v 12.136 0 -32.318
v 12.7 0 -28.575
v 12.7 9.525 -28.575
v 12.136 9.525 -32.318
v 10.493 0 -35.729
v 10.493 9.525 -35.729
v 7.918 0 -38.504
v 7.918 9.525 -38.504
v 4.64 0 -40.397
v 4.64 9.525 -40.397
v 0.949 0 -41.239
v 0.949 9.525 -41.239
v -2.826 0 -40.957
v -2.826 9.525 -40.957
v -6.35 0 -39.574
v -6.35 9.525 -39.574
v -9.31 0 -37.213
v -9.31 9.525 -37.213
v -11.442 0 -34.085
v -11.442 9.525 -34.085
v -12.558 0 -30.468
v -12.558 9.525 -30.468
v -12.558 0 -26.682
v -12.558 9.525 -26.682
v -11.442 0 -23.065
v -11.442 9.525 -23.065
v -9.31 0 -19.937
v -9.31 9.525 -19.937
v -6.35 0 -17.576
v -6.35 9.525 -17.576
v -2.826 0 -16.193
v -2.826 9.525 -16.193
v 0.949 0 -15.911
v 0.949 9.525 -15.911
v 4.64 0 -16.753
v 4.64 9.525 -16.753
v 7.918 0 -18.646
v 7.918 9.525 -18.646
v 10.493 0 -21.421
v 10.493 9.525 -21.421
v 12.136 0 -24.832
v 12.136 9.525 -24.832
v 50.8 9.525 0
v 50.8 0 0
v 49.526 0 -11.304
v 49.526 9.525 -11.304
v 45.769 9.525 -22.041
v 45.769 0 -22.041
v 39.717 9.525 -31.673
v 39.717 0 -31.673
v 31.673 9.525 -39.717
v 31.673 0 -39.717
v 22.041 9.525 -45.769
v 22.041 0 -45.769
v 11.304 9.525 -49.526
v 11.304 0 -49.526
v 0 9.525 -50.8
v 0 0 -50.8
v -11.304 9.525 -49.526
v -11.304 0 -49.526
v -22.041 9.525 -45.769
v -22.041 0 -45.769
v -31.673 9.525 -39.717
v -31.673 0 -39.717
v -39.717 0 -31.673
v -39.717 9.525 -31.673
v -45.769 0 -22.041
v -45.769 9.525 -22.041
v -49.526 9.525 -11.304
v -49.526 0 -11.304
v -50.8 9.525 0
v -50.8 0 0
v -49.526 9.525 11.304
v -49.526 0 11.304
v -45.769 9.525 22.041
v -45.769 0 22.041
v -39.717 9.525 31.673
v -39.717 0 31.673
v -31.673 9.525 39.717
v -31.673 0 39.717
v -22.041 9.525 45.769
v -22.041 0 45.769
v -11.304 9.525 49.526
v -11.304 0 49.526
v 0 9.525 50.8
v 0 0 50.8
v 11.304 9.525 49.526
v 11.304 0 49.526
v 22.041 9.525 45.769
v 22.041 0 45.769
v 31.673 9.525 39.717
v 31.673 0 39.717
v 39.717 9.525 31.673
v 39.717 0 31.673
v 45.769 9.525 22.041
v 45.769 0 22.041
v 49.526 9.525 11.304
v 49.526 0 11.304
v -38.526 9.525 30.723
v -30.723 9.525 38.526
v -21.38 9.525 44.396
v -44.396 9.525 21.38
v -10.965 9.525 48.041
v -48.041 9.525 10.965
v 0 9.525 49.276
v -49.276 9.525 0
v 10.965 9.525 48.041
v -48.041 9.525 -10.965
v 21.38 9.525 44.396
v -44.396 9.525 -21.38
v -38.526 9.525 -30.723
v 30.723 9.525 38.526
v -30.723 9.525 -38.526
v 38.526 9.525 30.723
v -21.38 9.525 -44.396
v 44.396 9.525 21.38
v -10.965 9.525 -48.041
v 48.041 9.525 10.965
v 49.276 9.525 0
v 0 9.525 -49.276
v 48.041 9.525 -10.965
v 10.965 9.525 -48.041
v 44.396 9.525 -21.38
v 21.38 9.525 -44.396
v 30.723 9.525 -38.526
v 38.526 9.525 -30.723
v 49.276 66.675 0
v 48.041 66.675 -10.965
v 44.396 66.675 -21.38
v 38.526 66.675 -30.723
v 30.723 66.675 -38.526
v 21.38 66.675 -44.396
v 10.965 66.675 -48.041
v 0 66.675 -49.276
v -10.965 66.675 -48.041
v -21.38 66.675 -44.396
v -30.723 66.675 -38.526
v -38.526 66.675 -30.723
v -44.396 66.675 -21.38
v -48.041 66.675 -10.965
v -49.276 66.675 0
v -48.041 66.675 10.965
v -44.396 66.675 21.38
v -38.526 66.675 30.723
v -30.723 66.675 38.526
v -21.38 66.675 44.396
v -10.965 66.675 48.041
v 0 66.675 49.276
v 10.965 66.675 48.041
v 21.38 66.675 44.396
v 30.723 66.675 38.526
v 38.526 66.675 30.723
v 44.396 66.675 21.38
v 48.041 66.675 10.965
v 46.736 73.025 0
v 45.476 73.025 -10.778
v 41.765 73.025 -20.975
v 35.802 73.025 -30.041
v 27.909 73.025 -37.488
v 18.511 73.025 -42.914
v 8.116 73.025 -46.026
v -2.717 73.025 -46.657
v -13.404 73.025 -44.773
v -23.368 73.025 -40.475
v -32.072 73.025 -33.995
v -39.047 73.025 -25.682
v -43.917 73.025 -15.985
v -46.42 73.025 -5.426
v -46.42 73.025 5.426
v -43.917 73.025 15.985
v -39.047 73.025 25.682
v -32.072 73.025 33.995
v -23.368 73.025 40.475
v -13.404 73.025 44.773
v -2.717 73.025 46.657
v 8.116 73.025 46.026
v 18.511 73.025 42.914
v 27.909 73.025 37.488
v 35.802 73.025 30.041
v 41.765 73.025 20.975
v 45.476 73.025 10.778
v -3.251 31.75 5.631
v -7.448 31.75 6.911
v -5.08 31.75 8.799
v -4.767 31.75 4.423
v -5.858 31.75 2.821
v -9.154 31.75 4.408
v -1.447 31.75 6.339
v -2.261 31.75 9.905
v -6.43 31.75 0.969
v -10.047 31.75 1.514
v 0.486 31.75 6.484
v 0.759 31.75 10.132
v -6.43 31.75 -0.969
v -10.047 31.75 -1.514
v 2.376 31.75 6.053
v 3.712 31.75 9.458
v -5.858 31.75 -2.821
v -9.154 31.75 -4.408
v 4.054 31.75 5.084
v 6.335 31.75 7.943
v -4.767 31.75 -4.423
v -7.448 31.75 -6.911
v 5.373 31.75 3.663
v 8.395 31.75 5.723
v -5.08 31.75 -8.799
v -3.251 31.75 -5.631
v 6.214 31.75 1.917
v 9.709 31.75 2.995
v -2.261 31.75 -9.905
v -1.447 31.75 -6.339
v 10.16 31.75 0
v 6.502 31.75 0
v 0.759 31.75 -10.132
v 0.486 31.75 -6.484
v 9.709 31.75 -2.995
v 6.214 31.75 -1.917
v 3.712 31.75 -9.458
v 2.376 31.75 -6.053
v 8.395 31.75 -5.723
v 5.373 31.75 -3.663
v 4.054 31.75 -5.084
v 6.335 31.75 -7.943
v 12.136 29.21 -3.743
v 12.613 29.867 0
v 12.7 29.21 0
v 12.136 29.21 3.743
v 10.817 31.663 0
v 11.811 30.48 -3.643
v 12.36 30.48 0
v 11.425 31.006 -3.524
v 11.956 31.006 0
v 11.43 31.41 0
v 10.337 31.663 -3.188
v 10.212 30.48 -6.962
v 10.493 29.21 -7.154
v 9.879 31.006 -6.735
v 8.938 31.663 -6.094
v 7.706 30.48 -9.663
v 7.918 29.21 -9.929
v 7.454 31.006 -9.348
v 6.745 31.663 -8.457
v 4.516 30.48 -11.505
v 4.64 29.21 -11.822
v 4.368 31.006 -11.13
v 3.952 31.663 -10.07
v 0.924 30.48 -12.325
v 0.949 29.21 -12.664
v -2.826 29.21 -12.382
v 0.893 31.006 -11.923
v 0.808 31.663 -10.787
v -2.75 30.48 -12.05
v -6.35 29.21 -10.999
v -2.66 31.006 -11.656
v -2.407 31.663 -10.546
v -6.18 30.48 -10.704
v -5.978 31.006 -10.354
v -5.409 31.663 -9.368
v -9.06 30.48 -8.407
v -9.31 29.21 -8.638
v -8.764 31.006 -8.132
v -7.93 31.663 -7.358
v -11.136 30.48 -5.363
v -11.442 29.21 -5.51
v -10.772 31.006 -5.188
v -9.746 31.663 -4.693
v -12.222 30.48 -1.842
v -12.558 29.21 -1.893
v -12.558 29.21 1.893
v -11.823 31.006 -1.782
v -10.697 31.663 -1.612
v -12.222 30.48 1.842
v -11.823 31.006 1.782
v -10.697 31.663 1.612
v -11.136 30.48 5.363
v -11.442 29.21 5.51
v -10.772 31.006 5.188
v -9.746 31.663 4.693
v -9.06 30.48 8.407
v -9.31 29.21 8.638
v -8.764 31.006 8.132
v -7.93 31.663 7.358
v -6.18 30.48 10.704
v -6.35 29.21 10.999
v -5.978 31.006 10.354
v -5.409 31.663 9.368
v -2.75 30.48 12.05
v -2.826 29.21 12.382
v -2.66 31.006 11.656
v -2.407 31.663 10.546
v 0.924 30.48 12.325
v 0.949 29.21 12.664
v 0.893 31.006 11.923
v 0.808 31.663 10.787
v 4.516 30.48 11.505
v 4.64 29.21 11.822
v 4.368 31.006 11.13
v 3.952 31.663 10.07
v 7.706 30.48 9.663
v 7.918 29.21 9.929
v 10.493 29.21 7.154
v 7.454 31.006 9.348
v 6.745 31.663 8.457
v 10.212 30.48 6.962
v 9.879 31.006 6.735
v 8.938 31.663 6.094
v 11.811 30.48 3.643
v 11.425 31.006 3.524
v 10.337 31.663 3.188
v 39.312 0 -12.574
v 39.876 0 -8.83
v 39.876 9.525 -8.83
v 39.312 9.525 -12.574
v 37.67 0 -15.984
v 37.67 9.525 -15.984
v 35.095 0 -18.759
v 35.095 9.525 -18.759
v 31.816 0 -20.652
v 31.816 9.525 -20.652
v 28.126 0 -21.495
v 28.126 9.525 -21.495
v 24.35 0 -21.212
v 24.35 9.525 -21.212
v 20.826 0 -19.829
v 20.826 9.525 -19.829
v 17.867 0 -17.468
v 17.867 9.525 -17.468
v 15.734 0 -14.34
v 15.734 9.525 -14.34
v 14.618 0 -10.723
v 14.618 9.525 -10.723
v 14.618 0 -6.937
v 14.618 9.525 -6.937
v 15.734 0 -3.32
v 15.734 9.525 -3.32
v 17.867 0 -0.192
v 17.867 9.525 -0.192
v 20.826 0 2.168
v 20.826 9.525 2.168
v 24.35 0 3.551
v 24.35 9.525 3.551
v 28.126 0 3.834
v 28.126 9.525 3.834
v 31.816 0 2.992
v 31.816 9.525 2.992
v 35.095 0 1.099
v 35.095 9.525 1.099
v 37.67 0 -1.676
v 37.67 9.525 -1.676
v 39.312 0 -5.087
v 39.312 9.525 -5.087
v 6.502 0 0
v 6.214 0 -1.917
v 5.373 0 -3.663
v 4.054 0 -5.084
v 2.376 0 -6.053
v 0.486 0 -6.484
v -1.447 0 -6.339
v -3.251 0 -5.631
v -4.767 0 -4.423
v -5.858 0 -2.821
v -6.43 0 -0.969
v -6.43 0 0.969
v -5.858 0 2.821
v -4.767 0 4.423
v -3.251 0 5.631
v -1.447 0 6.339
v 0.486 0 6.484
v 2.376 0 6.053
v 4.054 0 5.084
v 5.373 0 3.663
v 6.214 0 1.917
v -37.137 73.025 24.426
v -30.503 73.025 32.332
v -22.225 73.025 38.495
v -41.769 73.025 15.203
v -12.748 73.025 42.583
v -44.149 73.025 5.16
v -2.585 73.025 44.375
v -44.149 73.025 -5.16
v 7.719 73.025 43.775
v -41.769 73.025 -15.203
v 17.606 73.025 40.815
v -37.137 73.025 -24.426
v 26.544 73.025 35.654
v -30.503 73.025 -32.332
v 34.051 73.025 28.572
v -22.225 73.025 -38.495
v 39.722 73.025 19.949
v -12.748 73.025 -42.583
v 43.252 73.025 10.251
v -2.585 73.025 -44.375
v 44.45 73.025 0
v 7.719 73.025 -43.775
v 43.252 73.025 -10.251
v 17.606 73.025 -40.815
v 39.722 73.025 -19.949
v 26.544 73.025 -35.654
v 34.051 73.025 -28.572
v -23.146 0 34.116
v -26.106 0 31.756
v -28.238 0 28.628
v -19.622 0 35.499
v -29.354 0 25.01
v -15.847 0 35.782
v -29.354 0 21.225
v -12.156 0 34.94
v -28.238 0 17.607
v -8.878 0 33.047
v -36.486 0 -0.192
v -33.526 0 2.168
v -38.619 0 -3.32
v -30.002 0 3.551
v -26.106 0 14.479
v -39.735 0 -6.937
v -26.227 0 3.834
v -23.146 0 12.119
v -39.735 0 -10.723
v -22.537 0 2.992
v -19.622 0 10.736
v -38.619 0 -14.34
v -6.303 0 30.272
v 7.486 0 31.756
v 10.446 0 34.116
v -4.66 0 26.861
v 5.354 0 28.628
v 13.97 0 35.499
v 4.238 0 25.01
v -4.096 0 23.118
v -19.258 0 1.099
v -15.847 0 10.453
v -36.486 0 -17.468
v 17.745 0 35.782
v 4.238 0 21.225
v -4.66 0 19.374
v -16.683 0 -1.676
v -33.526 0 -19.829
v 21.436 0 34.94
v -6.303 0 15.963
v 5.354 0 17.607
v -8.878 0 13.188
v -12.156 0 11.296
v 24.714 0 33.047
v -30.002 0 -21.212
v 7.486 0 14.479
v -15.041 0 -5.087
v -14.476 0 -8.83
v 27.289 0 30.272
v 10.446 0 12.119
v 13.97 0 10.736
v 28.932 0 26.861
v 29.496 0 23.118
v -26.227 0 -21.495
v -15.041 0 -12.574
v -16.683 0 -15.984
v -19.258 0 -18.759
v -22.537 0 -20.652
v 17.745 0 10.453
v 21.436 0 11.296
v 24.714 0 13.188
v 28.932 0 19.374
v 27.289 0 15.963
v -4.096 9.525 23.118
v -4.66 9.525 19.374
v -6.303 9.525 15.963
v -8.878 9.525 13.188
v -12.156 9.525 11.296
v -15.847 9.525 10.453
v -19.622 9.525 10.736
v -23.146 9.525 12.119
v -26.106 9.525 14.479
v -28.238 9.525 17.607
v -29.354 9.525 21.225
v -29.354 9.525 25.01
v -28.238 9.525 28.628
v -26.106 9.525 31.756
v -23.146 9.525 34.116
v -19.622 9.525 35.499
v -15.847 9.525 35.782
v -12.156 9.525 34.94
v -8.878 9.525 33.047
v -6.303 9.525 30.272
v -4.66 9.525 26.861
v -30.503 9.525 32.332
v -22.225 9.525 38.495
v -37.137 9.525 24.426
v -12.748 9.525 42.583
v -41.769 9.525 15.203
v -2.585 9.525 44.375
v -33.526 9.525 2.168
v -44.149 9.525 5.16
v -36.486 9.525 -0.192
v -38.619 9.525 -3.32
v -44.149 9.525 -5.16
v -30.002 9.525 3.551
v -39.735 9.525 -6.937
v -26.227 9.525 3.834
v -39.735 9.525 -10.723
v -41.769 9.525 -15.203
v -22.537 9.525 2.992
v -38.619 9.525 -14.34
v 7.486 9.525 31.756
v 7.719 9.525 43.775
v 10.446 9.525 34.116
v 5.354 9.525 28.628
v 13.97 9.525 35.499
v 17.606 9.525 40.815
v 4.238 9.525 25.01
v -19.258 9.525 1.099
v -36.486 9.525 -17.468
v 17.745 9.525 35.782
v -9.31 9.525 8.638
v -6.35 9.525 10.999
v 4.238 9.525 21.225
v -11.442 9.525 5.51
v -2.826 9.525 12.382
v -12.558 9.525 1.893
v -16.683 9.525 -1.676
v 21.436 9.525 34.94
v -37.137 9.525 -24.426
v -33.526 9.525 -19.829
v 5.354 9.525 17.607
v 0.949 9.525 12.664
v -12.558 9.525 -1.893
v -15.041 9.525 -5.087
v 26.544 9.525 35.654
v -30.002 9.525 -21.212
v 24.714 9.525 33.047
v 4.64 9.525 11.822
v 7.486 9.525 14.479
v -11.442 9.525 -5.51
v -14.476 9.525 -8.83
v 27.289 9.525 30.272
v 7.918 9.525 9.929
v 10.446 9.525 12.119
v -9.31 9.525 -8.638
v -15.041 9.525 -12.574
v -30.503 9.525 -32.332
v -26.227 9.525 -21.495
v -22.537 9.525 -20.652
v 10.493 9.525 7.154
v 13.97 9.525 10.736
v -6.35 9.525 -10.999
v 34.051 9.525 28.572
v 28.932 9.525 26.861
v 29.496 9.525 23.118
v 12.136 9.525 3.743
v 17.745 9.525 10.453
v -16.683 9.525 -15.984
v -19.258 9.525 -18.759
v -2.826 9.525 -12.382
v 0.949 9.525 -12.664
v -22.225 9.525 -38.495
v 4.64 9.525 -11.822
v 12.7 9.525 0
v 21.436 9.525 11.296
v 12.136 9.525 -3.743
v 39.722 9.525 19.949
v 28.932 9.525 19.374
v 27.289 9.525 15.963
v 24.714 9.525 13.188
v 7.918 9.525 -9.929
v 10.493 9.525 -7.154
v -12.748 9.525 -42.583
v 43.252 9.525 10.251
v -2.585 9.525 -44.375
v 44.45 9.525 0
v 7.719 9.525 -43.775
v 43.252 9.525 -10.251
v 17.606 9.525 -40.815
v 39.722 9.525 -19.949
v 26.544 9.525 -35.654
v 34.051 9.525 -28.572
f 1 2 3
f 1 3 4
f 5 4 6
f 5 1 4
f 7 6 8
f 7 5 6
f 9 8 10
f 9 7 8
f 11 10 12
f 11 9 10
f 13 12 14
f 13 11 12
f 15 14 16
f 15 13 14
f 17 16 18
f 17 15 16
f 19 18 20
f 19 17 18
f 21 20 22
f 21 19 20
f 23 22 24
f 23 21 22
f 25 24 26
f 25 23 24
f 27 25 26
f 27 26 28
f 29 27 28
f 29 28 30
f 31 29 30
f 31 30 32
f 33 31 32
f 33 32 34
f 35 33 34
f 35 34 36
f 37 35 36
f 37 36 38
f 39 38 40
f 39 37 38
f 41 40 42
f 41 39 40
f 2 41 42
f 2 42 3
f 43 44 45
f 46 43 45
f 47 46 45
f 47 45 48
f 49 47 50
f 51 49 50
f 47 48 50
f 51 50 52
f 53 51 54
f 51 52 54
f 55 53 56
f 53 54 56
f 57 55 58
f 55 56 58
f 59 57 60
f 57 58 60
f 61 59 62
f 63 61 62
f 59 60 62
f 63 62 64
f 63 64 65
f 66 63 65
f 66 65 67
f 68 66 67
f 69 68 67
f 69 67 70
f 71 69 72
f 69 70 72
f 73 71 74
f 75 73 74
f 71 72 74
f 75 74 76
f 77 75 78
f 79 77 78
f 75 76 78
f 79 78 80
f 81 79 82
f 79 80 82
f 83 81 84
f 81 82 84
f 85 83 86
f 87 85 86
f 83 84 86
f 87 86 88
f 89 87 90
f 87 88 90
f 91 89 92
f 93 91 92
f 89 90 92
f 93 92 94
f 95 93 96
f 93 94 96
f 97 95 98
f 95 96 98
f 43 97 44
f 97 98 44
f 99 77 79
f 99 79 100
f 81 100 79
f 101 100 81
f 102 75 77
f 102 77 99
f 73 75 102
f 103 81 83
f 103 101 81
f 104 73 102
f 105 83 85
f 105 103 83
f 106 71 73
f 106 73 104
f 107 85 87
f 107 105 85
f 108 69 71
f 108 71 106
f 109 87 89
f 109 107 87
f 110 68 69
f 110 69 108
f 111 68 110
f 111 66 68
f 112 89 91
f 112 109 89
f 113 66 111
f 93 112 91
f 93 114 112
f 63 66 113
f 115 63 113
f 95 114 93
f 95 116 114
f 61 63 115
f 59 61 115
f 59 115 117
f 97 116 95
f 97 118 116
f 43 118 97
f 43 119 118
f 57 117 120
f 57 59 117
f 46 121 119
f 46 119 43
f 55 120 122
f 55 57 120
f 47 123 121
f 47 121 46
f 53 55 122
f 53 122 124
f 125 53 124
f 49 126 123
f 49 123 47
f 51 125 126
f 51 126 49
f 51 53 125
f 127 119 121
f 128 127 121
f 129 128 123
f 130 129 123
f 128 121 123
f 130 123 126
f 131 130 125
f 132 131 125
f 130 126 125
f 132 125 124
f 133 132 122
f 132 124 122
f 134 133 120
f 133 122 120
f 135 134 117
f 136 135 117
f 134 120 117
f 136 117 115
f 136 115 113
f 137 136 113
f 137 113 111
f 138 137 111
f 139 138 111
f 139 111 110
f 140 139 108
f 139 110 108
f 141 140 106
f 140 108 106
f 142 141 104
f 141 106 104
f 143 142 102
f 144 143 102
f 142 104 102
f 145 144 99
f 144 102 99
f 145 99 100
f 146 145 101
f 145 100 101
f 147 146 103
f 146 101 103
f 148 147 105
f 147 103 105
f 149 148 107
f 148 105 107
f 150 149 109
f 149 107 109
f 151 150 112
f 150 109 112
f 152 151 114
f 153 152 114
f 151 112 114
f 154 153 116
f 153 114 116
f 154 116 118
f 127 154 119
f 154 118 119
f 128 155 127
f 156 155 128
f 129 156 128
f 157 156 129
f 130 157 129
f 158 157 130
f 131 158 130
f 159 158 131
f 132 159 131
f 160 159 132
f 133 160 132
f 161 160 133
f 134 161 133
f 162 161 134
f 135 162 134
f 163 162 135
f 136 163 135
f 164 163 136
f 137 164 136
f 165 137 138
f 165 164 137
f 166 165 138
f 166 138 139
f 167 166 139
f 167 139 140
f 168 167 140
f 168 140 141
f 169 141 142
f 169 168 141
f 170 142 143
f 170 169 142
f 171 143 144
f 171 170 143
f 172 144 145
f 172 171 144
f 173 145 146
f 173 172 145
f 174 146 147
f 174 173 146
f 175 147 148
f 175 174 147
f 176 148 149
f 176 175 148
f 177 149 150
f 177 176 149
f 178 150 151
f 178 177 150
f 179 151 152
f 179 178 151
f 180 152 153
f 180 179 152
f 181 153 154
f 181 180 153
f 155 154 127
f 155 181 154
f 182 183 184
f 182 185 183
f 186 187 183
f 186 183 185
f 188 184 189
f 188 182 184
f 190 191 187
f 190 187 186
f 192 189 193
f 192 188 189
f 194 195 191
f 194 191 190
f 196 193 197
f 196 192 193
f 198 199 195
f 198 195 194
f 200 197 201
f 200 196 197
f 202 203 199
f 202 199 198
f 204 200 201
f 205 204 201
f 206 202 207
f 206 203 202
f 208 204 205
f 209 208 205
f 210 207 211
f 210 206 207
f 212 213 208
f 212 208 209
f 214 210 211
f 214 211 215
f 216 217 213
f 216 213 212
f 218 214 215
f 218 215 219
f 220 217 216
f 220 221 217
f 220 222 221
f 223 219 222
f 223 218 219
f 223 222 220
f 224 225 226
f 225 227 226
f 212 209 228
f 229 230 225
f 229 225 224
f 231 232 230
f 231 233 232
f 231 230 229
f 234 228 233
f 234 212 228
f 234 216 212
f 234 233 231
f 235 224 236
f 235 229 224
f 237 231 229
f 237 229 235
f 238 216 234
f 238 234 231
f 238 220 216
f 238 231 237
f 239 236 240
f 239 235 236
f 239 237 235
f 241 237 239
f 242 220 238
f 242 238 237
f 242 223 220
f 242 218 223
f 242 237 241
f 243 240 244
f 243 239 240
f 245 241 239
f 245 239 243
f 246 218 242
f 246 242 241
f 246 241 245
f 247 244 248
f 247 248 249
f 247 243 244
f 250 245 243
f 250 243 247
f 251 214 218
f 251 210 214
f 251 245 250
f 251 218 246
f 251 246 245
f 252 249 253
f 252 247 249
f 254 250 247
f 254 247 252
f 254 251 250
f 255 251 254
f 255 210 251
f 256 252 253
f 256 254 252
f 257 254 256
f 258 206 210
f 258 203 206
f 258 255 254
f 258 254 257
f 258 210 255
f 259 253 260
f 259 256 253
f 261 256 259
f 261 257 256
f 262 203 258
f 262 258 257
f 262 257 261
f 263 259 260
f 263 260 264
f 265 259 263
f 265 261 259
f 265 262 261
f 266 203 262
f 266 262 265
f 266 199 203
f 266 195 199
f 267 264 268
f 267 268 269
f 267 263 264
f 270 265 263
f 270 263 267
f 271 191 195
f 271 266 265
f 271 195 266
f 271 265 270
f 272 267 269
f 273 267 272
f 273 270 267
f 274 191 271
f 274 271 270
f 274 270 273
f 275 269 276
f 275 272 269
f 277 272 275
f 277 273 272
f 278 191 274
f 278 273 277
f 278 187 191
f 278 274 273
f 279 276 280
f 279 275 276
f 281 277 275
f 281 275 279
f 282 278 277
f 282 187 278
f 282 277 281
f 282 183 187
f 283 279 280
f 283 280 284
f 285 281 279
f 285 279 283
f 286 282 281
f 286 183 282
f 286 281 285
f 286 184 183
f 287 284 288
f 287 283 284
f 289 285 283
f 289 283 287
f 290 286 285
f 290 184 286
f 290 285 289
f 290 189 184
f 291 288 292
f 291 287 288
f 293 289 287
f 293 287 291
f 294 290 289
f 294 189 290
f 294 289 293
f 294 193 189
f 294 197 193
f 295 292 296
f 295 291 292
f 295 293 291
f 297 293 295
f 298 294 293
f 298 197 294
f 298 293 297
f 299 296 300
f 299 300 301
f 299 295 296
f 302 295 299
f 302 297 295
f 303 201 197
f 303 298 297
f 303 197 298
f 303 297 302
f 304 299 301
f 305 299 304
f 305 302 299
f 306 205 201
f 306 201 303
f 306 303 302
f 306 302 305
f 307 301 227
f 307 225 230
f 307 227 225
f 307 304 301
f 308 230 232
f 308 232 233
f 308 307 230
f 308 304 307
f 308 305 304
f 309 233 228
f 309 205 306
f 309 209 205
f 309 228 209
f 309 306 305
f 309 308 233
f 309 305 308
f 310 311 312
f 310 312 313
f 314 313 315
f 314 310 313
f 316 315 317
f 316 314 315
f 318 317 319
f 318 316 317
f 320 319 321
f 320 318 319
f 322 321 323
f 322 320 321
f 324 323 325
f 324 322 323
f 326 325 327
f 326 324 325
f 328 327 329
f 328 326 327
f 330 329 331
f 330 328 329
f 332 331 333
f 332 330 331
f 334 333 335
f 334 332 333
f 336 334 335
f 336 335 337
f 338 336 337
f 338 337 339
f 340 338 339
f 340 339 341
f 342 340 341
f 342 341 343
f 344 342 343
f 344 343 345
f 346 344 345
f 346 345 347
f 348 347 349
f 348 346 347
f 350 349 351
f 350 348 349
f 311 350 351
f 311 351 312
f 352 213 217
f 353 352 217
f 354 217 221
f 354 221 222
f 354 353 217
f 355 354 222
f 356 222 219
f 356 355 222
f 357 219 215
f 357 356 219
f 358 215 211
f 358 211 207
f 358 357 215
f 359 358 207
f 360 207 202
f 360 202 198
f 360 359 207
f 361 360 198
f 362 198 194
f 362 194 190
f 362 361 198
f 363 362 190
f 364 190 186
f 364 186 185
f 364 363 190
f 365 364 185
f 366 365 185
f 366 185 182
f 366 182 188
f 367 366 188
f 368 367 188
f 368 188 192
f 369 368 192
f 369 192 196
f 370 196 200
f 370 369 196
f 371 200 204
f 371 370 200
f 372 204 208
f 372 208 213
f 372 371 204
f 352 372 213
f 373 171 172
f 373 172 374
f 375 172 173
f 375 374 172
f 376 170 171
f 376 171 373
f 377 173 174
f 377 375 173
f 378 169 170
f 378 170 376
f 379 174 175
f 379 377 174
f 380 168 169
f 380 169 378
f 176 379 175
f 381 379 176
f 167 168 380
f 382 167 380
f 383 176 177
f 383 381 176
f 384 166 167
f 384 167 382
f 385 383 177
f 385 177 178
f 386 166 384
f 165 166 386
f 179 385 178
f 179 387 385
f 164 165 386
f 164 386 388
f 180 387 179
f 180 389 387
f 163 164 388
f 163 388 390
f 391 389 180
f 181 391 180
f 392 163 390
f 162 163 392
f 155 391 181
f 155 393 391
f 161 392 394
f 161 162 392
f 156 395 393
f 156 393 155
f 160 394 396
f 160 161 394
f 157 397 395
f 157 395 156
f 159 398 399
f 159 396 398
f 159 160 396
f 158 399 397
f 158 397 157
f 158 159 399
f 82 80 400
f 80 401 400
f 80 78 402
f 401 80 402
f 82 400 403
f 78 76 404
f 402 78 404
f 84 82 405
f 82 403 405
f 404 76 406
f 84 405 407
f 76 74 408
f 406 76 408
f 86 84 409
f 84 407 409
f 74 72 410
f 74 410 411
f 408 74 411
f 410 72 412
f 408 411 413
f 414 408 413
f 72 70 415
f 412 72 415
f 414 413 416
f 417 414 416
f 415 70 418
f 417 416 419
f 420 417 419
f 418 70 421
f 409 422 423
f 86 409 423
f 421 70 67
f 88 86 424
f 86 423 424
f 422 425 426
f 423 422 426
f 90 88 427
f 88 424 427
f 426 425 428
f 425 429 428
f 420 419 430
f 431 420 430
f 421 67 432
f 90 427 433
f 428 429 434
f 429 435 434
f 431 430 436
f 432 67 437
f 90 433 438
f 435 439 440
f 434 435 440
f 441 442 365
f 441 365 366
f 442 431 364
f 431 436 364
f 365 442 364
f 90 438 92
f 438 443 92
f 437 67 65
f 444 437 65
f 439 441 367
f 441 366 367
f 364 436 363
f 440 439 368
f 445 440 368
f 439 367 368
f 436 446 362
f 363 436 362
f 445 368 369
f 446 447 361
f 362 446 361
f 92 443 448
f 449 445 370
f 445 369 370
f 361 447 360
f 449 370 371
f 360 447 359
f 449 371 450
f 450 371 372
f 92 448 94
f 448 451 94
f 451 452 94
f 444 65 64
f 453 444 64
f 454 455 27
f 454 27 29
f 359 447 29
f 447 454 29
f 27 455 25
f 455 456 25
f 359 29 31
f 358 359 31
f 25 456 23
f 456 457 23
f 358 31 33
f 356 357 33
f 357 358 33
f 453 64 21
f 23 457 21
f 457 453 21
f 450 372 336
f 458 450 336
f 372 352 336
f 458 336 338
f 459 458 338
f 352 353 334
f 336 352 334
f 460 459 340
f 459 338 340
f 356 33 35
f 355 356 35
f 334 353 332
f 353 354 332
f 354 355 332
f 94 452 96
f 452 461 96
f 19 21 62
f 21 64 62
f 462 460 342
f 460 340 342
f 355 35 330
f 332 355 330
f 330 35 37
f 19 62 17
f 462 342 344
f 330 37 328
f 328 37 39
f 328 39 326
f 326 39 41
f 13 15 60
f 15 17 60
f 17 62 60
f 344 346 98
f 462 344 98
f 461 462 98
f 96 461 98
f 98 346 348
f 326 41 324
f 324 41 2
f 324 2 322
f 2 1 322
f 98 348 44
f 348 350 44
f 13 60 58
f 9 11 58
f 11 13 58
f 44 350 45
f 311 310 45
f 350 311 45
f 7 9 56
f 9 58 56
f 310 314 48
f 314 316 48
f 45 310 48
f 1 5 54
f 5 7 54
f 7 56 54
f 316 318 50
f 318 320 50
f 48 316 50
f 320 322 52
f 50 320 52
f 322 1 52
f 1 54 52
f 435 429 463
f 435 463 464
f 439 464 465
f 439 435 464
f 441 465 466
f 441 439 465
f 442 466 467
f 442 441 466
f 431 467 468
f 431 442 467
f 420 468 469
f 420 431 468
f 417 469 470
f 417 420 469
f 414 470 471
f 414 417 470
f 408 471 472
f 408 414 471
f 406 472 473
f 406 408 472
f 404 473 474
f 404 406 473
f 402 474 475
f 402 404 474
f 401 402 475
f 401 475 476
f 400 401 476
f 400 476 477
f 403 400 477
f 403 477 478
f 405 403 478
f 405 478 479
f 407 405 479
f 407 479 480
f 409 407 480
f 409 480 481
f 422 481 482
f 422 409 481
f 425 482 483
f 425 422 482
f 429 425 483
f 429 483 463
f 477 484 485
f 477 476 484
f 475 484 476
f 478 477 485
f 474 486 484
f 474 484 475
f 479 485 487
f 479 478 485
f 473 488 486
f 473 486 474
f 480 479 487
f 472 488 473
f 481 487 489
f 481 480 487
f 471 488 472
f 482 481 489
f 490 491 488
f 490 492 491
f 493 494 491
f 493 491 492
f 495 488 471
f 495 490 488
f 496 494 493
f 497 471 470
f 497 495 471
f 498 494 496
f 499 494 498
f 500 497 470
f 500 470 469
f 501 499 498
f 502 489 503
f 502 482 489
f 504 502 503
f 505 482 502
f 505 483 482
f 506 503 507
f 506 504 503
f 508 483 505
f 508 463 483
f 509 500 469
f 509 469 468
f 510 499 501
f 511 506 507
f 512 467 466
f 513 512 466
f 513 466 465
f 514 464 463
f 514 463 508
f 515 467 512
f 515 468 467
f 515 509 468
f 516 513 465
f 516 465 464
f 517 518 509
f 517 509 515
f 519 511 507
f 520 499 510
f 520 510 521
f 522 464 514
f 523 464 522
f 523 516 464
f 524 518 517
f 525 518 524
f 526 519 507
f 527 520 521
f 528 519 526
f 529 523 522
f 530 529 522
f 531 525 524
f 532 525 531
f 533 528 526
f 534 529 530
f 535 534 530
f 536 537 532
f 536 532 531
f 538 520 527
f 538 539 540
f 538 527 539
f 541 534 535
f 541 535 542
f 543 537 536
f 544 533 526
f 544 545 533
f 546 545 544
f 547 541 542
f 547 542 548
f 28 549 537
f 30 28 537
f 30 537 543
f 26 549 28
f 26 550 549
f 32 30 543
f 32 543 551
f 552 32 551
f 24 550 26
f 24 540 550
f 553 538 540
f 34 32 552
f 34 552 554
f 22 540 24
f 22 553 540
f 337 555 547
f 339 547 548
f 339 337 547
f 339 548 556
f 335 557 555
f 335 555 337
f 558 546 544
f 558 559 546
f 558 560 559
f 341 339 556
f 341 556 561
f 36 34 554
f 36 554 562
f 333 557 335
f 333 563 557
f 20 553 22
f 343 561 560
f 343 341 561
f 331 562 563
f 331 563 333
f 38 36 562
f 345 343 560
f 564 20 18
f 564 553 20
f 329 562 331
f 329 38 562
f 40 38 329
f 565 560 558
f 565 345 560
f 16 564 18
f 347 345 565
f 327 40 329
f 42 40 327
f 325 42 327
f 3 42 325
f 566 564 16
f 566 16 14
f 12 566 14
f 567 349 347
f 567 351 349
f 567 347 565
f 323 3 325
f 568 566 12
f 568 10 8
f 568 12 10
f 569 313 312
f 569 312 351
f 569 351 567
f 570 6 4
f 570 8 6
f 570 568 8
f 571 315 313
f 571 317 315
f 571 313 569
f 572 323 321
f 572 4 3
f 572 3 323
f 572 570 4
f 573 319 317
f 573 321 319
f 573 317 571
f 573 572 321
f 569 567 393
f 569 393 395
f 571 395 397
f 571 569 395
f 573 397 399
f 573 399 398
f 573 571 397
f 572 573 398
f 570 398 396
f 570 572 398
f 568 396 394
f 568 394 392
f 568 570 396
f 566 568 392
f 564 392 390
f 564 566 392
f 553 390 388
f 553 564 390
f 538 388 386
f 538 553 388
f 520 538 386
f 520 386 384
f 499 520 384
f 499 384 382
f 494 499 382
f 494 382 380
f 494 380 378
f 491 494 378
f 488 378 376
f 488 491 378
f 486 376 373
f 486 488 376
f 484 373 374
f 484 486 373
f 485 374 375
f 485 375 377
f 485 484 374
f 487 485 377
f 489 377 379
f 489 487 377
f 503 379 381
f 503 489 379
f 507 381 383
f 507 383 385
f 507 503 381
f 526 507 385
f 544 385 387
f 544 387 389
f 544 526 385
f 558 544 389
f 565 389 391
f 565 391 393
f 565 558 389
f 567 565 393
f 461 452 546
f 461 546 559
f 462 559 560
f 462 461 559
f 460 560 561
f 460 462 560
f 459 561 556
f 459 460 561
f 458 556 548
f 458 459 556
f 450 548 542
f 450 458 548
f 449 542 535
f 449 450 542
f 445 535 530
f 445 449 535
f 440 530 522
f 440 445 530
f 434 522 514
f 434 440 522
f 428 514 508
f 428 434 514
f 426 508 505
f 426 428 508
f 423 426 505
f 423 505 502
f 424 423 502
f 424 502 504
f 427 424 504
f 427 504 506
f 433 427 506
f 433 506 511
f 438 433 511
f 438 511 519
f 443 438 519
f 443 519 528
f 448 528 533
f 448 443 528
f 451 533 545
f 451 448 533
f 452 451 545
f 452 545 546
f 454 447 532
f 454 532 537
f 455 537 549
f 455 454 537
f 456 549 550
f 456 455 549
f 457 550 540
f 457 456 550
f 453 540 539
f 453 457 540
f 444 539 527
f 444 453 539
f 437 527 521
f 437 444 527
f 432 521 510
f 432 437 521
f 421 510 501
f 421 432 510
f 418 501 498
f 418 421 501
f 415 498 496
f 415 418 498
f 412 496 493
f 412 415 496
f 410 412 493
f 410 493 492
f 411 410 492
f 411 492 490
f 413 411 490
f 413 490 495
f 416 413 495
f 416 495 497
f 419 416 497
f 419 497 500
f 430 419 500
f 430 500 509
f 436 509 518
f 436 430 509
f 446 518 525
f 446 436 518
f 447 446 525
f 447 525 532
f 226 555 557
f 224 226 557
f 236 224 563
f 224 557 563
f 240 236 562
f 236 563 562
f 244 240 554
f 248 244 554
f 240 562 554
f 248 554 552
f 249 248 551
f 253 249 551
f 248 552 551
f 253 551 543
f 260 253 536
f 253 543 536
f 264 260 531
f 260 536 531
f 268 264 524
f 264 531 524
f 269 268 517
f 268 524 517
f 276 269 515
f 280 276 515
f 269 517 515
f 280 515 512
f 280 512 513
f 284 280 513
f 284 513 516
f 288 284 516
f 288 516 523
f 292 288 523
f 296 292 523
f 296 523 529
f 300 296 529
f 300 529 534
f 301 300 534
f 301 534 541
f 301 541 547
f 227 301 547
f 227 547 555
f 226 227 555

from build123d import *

# Parameters (mm, degrees)
SKETCH1_R           = 50.8
SKETCH1_R_2         = 6.5024
SKETCH1_R_3         = 12.7
BOSS_EXTRUDE1_DEPTH = 9.525
SKETCH2_R           = 49.276
SKETCH2_R_2         = 44.45
BOSS_EXTRUDE2_DEPTH = 63.5
SKETCH3_R           = 12.7
SKETCH3_R_2         = 6.5024
BOSS_EXTRUDE3_DEPTH = 15.875
CHAMFER1_SIZE       = 6.35
CHAMFER1_SIZE2      = 2.54
SKETCH4_R           = 12.7
SKETCH4_R_2         = 6.5024
BOSS_EXTRUDE4_DEPTH = 6.35
FILLET1_R           = 2.54


with BuildPart() as part:
    # Sketch1 → Boss-Extrude1 (new body)
    with BuildSketch(Plane(origin=(0, 0, 0), x_dir=(1, 0, 0), z_dir=(0, 1, 0))):
        Circle(SKETCH1_R)
        Circle(SKETCH1_R_2, mode=Mode.SUBTRACT)
        with Locations((0, 28.575)):
            Circle(SKETCH1_R_3, mode=Mode.SUBTRACT)
        with Locations((27.176439953, 8.830160614)):
            Circle(SKETCH1_R_3, mode=Mode.SUBTRACT)
        with Locations((16.795963584, -23.117660614)):
            Circle(SKETCH1_R_3, mode=Mode.SUBTRACT)
        with Locations((-16.795963584, -23.117660614)):
            Circle(SKETCH1_R_3, mode=Mode.SUBTRACT)
        with Locations((-27.176439953, 8.830160614)):
            Circle(SKETCH1_R_3, mode=Mode.SUBTRACT)
    extrude(amount=BOSS_EXTRUDE1_DEPTH)

    # Sketch2 → Boss-Extrude2 (add)
    with BuildSketch(Plane(origin=(0, 9.525, 0), x_dir=(1, 0, 0), z_dir=(0, 1, 0))):
        Circle(SKETCH2_R)
        Circle(SKETCH2_R_2, mode=Mode.SUBTRACT)
    extrude(amount=BOSS_EXTRUDE2_DEPTH)

    # Sketch3 → Boss-Extrude3 (add)
    with BuildSketch(Plane(origin=(0, 9.525, 0), x_dir=(1, 0, 0), z_dir=(0, 1, 0))):
        Circle(SKETCH3_R)
        Circle(SKETCH3_R_2, mode=Mode.SUBTRACT)
    extrude(amount=BOSS_EXTRUDE3_DEPTH)

    # Chamfer1
    chamfer1_edges = [part.edges().sort_by_distance(p)[0] for p in [
        (-49.276, 73.025, 0),
    ]]
    chamfer1_side = [part.faces().sort_by_distance(p)[0] for p in [
        (-49.276, 41.275, 0),
    ]]
    chamfer(chamfer1_edges, length=CHAMFER1_SIZE, length2=CHAMFER1_SIZE2, reference=chamfer1_side[0])

    # Sketch4 → Boss-Extrude4 (add)
    with BuildSketch(Plane(origin=(0, 25.4, 0), x_dir=(1, 0, 0), z_dir=(0, 1, 0))):
        Circle(SKETCH4_R)
        Circle(SKETCH4_R_2, mode=Mode.SUBTRACT)
    extrude(amount=BOSS_EXTRUDE4_DEPTH)

    # Fillet1
    fillet1_edges = [part.edges().sort_by_distance(p)[0] for p in [
        (-12.7, 31.75, 0),
    ]]
    fillet(fillet1_edges, radius=FILLET1_R)


solid = part.part
